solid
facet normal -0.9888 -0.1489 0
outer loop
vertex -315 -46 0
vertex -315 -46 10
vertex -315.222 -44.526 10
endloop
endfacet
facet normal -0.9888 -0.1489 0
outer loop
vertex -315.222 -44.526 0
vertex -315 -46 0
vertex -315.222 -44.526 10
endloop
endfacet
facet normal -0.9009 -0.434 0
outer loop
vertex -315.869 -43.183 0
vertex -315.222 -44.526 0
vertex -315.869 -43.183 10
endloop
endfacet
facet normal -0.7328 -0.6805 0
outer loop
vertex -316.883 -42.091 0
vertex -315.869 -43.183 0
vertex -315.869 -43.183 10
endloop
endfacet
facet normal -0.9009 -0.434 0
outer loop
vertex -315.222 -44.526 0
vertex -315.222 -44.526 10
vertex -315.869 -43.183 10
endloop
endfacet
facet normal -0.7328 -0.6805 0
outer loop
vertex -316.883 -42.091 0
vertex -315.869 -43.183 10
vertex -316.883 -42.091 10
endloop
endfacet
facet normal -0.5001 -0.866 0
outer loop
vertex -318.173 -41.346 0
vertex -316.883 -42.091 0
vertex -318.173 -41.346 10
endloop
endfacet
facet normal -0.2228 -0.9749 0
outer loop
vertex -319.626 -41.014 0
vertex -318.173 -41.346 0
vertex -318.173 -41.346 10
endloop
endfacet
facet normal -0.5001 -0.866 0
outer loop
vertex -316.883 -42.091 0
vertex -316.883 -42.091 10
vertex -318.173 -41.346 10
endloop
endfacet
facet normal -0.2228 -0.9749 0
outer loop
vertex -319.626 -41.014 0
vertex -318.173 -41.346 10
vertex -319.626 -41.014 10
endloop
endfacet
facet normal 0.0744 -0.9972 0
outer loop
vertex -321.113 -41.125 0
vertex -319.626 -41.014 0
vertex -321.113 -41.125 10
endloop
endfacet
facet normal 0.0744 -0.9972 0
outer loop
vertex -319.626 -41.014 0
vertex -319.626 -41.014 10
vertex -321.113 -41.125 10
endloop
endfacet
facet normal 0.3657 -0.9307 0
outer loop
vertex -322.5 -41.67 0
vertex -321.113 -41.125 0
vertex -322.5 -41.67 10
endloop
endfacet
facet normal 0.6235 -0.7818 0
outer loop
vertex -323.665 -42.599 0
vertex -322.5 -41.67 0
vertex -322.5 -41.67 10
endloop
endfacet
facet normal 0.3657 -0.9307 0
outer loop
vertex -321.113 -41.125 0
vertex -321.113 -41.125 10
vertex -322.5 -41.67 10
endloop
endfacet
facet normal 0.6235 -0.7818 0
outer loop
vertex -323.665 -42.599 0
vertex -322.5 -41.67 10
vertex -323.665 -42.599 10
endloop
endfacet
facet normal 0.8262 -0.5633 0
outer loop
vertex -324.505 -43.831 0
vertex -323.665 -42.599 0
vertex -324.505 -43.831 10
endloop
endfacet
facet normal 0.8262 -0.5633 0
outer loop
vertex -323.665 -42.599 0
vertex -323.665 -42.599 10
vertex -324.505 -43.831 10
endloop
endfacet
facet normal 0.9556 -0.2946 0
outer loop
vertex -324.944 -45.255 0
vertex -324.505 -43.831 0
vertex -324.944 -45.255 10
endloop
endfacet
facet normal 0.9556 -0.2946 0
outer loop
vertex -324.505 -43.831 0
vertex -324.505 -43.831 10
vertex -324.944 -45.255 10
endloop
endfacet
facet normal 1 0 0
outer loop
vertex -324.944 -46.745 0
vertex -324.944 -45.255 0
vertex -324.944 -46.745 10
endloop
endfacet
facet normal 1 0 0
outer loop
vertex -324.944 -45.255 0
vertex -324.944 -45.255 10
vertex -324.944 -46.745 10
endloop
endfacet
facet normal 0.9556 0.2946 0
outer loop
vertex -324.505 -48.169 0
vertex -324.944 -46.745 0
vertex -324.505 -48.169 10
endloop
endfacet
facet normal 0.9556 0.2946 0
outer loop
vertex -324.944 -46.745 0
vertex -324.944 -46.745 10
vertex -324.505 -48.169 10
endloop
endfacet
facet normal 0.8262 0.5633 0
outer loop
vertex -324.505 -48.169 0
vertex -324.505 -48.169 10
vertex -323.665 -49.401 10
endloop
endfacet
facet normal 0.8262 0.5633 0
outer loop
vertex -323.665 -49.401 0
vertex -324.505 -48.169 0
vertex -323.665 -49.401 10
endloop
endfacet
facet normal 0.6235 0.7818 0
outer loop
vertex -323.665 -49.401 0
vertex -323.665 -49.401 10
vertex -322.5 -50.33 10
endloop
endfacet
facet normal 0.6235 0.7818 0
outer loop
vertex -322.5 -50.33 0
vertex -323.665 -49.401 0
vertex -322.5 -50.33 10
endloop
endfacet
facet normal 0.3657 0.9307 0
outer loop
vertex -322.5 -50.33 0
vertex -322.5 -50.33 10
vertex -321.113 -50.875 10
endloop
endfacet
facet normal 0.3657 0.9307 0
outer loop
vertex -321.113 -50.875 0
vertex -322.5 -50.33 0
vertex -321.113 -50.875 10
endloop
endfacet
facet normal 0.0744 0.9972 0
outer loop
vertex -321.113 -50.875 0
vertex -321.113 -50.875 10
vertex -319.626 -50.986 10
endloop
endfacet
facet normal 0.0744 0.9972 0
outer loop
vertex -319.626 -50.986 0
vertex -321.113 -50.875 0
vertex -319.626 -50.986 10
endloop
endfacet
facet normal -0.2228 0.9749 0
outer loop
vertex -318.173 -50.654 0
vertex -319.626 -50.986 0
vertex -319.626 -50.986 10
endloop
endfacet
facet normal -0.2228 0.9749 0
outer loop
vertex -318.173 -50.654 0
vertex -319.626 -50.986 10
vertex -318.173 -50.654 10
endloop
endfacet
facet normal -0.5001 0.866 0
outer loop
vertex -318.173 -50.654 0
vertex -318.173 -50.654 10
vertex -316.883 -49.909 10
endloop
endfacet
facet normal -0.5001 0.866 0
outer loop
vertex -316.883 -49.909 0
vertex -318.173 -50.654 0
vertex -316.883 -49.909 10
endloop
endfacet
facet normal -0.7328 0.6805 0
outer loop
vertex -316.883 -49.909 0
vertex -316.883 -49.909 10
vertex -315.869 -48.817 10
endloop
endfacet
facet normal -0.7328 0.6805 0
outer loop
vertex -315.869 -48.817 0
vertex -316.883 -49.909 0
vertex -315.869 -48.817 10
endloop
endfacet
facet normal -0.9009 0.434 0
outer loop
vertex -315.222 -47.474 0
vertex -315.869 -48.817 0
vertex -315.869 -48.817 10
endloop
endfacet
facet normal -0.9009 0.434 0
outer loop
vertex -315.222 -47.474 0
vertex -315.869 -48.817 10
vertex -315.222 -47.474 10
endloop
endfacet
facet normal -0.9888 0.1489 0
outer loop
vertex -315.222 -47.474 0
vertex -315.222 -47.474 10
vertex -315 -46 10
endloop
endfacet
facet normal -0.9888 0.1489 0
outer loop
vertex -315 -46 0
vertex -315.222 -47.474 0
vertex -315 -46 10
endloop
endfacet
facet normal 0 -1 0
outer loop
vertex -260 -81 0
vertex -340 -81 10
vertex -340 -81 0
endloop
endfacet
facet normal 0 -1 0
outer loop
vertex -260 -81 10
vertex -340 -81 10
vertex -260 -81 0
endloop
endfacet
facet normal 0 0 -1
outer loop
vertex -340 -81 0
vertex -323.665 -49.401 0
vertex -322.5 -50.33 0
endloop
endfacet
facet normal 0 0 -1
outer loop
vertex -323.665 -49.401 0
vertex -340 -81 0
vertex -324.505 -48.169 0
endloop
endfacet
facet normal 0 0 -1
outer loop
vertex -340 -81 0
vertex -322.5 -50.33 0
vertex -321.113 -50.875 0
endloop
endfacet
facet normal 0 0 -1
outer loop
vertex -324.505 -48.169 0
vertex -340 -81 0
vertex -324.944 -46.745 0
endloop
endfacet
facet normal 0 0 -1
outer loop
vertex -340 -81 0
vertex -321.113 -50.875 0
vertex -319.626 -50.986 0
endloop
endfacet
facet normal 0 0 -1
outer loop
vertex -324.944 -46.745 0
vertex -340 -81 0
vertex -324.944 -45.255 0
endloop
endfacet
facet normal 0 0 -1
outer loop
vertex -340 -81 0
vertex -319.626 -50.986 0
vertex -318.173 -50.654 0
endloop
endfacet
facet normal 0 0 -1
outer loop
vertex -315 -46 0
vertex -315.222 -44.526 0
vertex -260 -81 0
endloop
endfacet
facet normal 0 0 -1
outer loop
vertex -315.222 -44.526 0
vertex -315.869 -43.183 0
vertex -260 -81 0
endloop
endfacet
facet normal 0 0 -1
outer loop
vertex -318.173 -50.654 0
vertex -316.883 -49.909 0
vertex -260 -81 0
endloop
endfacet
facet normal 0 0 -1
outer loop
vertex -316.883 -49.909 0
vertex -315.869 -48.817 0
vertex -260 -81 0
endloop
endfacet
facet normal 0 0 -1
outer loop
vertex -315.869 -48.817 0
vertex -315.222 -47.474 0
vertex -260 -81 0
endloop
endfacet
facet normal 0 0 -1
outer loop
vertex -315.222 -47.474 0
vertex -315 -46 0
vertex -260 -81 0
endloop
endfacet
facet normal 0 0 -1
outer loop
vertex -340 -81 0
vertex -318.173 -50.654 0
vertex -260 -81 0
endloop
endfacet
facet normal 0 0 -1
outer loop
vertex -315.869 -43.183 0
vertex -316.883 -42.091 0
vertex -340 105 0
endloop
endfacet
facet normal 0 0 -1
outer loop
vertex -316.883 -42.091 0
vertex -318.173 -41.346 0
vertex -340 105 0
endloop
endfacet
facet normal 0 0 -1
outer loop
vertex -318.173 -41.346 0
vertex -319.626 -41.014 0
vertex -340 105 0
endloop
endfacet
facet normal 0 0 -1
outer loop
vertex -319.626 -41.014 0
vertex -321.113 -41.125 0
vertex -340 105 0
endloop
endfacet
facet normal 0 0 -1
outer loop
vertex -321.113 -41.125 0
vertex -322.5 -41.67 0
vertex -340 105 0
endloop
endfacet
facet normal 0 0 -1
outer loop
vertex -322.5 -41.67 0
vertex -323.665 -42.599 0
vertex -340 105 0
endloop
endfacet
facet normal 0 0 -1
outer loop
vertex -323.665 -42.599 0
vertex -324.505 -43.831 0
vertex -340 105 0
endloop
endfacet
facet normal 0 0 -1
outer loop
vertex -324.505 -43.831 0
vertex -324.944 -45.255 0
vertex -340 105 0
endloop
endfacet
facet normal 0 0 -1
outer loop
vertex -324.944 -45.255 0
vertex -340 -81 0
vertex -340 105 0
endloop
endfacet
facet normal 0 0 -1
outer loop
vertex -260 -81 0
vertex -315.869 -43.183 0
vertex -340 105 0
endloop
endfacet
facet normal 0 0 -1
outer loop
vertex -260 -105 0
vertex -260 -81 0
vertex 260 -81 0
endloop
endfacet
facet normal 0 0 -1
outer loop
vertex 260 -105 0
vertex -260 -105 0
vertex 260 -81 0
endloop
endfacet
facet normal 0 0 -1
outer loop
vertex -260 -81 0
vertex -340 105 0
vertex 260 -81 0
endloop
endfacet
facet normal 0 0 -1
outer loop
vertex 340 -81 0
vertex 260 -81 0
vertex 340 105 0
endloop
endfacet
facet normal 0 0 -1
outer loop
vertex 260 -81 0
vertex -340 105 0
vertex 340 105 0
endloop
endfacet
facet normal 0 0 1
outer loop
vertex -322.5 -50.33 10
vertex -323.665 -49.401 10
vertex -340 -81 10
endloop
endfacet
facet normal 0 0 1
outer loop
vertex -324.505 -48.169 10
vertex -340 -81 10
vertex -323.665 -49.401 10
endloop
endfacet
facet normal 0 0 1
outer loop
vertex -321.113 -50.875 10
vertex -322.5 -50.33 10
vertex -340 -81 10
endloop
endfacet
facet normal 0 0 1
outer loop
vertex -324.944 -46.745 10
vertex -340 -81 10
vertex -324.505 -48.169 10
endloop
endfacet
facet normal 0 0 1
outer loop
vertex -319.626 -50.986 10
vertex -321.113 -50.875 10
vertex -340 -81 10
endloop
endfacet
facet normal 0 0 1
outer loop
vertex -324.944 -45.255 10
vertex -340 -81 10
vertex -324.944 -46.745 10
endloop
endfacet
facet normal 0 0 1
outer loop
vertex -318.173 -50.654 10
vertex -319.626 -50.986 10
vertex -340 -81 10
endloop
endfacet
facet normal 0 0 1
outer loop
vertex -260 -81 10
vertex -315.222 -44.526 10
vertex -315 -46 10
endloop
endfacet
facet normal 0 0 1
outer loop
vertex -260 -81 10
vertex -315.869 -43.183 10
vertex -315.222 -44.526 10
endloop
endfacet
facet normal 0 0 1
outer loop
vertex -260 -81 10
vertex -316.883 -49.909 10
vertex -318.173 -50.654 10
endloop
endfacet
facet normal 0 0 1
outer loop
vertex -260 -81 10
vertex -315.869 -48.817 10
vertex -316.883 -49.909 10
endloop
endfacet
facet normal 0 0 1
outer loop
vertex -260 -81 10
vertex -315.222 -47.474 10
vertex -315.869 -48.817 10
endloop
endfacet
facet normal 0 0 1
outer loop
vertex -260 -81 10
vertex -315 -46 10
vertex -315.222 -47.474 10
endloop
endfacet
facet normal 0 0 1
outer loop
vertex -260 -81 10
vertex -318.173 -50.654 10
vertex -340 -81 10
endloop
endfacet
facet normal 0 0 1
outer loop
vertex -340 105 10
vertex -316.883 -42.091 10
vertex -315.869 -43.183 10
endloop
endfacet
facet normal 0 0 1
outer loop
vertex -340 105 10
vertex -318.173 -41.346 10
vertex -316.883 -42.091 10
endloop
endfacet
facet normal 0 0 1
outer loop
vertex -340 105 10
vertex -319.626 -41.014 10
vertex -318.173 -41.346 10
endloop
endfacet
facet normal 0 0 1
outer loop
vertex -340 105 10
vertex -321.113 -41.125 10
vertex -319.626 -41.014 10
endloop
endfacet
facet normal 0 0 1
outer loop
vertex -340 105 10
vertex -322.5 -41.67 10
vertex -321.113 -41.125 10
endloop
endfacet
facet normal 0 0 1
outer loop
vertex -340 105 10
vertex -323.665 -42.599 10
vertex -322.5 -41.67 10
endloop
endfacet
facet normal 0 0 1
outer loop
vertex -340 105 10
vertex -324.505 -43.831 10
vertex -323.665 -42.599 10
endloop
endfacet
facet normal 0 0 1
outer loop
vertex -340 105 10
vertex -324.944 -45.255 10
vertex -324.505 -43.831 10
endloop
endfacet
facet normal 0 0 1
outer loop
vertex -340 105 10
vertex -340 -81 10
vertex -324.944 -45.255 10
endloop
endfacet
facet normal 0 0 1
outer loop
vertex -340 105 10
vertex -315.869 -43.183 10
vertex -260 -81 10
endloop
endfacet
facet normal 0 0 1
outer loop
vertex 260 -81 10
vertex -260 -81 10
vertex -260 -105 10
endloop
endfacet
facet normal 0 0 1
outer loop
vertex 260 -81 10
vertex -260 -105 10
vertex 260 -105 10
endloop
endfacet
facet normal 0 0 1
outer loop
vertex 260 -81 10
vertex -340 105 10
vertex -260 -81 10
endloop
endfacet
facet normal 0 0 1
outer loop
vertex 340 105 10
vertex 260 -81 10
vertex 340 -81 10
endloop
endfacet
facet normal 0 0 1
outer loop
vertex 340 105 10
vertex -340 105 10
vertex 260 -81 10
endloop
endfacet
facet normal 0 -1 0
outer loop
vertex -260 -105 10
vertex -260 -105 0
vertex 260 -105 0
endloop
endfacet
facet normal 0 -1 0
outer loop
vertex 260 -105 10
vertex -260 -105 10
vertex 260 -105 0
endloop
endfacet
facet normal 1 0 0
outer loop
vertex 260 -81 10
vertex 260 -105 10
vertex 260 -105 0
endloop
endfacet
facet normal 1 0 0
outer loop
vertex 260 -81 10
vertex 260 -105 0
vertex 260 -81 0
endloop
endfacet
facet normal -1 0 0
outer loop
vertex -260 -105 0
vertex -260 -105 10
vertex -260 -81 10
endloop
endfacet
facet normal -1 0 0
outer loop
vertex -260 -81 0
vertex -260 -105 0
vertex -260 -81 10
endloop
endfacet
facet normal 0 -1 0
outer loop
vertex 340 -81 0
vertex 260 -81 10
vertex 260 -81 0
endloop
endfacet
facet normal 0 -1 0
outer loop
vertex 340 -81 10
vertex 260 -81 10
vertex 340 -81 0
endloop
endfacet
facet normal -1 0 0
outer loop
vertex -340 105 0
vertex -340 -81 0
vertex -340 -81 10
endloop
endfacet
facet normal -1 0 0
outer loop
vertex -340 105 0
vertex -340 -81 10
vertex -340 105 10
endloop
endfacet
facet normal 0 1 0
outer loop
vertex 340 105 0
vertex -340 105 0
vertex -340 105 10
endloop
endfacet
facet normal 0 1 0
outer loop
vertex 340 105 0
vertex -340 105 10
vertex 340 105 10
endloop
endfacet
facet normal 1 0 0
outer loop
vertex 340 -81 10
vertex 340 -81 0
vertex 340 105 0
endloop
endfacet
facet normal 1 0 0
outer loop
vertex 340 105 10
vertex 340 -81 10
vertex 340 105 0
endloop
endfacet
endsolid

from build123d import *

# Parameters (mm, degrees)
ESQUISSE1_W             = 680
ESQUISSE1_H             = 210
BOSS_EXTRU_1_DEPTH      = 10
ESQUISSE2_W             = 80
ESQUISSE2_H             = 24
ENL_V_MAT_EXTRU_1_DEPTH = 11
ESQUISSE3_R             = 5
ENL_V_MAT_EXTRU_2_DEPTH = 11


with BuildPart() as part:
    # Esquisse1 → Boss.-Extru.1 (new body)
    with BuildSketch(Plane.XY):
        Rectangle(ESQUISSE1_W, ESQUISSE1_H)
    extrude(amount=BOSS_EXTRU_1_DEPTH)

    # Esquisse2 → Enlèv. mat.-Extru.1 (cut, through all)
    with BuildSketch(Plane.XY.offset(10)):
        with Locations((-300, -93)):
            Rectangle(ESQUISSE2_W, ESQUISSE2_H)
        with Locations((300, -93)):
            Rectangle(ESQUISSE2_W, ESQUISSE2_H)
    extrude(amount=-ENL_V_MAT_EXTRU_1_DEPTH, mode=Mode.SUBTRACT)

    # Esquisse3 → Enlèv. mat.-Extru.2 (cut, through all)
    with BuildSketch(Plane.XY.offset(10)):
        with Locations((-320, -46)):
            Circle(ESQUISSE3_R)
    extrude(amount=-ENL_V_MAT_EXTRU_2_DEPTH, mode=Mode.SUBTRACT)


solid = part.part
